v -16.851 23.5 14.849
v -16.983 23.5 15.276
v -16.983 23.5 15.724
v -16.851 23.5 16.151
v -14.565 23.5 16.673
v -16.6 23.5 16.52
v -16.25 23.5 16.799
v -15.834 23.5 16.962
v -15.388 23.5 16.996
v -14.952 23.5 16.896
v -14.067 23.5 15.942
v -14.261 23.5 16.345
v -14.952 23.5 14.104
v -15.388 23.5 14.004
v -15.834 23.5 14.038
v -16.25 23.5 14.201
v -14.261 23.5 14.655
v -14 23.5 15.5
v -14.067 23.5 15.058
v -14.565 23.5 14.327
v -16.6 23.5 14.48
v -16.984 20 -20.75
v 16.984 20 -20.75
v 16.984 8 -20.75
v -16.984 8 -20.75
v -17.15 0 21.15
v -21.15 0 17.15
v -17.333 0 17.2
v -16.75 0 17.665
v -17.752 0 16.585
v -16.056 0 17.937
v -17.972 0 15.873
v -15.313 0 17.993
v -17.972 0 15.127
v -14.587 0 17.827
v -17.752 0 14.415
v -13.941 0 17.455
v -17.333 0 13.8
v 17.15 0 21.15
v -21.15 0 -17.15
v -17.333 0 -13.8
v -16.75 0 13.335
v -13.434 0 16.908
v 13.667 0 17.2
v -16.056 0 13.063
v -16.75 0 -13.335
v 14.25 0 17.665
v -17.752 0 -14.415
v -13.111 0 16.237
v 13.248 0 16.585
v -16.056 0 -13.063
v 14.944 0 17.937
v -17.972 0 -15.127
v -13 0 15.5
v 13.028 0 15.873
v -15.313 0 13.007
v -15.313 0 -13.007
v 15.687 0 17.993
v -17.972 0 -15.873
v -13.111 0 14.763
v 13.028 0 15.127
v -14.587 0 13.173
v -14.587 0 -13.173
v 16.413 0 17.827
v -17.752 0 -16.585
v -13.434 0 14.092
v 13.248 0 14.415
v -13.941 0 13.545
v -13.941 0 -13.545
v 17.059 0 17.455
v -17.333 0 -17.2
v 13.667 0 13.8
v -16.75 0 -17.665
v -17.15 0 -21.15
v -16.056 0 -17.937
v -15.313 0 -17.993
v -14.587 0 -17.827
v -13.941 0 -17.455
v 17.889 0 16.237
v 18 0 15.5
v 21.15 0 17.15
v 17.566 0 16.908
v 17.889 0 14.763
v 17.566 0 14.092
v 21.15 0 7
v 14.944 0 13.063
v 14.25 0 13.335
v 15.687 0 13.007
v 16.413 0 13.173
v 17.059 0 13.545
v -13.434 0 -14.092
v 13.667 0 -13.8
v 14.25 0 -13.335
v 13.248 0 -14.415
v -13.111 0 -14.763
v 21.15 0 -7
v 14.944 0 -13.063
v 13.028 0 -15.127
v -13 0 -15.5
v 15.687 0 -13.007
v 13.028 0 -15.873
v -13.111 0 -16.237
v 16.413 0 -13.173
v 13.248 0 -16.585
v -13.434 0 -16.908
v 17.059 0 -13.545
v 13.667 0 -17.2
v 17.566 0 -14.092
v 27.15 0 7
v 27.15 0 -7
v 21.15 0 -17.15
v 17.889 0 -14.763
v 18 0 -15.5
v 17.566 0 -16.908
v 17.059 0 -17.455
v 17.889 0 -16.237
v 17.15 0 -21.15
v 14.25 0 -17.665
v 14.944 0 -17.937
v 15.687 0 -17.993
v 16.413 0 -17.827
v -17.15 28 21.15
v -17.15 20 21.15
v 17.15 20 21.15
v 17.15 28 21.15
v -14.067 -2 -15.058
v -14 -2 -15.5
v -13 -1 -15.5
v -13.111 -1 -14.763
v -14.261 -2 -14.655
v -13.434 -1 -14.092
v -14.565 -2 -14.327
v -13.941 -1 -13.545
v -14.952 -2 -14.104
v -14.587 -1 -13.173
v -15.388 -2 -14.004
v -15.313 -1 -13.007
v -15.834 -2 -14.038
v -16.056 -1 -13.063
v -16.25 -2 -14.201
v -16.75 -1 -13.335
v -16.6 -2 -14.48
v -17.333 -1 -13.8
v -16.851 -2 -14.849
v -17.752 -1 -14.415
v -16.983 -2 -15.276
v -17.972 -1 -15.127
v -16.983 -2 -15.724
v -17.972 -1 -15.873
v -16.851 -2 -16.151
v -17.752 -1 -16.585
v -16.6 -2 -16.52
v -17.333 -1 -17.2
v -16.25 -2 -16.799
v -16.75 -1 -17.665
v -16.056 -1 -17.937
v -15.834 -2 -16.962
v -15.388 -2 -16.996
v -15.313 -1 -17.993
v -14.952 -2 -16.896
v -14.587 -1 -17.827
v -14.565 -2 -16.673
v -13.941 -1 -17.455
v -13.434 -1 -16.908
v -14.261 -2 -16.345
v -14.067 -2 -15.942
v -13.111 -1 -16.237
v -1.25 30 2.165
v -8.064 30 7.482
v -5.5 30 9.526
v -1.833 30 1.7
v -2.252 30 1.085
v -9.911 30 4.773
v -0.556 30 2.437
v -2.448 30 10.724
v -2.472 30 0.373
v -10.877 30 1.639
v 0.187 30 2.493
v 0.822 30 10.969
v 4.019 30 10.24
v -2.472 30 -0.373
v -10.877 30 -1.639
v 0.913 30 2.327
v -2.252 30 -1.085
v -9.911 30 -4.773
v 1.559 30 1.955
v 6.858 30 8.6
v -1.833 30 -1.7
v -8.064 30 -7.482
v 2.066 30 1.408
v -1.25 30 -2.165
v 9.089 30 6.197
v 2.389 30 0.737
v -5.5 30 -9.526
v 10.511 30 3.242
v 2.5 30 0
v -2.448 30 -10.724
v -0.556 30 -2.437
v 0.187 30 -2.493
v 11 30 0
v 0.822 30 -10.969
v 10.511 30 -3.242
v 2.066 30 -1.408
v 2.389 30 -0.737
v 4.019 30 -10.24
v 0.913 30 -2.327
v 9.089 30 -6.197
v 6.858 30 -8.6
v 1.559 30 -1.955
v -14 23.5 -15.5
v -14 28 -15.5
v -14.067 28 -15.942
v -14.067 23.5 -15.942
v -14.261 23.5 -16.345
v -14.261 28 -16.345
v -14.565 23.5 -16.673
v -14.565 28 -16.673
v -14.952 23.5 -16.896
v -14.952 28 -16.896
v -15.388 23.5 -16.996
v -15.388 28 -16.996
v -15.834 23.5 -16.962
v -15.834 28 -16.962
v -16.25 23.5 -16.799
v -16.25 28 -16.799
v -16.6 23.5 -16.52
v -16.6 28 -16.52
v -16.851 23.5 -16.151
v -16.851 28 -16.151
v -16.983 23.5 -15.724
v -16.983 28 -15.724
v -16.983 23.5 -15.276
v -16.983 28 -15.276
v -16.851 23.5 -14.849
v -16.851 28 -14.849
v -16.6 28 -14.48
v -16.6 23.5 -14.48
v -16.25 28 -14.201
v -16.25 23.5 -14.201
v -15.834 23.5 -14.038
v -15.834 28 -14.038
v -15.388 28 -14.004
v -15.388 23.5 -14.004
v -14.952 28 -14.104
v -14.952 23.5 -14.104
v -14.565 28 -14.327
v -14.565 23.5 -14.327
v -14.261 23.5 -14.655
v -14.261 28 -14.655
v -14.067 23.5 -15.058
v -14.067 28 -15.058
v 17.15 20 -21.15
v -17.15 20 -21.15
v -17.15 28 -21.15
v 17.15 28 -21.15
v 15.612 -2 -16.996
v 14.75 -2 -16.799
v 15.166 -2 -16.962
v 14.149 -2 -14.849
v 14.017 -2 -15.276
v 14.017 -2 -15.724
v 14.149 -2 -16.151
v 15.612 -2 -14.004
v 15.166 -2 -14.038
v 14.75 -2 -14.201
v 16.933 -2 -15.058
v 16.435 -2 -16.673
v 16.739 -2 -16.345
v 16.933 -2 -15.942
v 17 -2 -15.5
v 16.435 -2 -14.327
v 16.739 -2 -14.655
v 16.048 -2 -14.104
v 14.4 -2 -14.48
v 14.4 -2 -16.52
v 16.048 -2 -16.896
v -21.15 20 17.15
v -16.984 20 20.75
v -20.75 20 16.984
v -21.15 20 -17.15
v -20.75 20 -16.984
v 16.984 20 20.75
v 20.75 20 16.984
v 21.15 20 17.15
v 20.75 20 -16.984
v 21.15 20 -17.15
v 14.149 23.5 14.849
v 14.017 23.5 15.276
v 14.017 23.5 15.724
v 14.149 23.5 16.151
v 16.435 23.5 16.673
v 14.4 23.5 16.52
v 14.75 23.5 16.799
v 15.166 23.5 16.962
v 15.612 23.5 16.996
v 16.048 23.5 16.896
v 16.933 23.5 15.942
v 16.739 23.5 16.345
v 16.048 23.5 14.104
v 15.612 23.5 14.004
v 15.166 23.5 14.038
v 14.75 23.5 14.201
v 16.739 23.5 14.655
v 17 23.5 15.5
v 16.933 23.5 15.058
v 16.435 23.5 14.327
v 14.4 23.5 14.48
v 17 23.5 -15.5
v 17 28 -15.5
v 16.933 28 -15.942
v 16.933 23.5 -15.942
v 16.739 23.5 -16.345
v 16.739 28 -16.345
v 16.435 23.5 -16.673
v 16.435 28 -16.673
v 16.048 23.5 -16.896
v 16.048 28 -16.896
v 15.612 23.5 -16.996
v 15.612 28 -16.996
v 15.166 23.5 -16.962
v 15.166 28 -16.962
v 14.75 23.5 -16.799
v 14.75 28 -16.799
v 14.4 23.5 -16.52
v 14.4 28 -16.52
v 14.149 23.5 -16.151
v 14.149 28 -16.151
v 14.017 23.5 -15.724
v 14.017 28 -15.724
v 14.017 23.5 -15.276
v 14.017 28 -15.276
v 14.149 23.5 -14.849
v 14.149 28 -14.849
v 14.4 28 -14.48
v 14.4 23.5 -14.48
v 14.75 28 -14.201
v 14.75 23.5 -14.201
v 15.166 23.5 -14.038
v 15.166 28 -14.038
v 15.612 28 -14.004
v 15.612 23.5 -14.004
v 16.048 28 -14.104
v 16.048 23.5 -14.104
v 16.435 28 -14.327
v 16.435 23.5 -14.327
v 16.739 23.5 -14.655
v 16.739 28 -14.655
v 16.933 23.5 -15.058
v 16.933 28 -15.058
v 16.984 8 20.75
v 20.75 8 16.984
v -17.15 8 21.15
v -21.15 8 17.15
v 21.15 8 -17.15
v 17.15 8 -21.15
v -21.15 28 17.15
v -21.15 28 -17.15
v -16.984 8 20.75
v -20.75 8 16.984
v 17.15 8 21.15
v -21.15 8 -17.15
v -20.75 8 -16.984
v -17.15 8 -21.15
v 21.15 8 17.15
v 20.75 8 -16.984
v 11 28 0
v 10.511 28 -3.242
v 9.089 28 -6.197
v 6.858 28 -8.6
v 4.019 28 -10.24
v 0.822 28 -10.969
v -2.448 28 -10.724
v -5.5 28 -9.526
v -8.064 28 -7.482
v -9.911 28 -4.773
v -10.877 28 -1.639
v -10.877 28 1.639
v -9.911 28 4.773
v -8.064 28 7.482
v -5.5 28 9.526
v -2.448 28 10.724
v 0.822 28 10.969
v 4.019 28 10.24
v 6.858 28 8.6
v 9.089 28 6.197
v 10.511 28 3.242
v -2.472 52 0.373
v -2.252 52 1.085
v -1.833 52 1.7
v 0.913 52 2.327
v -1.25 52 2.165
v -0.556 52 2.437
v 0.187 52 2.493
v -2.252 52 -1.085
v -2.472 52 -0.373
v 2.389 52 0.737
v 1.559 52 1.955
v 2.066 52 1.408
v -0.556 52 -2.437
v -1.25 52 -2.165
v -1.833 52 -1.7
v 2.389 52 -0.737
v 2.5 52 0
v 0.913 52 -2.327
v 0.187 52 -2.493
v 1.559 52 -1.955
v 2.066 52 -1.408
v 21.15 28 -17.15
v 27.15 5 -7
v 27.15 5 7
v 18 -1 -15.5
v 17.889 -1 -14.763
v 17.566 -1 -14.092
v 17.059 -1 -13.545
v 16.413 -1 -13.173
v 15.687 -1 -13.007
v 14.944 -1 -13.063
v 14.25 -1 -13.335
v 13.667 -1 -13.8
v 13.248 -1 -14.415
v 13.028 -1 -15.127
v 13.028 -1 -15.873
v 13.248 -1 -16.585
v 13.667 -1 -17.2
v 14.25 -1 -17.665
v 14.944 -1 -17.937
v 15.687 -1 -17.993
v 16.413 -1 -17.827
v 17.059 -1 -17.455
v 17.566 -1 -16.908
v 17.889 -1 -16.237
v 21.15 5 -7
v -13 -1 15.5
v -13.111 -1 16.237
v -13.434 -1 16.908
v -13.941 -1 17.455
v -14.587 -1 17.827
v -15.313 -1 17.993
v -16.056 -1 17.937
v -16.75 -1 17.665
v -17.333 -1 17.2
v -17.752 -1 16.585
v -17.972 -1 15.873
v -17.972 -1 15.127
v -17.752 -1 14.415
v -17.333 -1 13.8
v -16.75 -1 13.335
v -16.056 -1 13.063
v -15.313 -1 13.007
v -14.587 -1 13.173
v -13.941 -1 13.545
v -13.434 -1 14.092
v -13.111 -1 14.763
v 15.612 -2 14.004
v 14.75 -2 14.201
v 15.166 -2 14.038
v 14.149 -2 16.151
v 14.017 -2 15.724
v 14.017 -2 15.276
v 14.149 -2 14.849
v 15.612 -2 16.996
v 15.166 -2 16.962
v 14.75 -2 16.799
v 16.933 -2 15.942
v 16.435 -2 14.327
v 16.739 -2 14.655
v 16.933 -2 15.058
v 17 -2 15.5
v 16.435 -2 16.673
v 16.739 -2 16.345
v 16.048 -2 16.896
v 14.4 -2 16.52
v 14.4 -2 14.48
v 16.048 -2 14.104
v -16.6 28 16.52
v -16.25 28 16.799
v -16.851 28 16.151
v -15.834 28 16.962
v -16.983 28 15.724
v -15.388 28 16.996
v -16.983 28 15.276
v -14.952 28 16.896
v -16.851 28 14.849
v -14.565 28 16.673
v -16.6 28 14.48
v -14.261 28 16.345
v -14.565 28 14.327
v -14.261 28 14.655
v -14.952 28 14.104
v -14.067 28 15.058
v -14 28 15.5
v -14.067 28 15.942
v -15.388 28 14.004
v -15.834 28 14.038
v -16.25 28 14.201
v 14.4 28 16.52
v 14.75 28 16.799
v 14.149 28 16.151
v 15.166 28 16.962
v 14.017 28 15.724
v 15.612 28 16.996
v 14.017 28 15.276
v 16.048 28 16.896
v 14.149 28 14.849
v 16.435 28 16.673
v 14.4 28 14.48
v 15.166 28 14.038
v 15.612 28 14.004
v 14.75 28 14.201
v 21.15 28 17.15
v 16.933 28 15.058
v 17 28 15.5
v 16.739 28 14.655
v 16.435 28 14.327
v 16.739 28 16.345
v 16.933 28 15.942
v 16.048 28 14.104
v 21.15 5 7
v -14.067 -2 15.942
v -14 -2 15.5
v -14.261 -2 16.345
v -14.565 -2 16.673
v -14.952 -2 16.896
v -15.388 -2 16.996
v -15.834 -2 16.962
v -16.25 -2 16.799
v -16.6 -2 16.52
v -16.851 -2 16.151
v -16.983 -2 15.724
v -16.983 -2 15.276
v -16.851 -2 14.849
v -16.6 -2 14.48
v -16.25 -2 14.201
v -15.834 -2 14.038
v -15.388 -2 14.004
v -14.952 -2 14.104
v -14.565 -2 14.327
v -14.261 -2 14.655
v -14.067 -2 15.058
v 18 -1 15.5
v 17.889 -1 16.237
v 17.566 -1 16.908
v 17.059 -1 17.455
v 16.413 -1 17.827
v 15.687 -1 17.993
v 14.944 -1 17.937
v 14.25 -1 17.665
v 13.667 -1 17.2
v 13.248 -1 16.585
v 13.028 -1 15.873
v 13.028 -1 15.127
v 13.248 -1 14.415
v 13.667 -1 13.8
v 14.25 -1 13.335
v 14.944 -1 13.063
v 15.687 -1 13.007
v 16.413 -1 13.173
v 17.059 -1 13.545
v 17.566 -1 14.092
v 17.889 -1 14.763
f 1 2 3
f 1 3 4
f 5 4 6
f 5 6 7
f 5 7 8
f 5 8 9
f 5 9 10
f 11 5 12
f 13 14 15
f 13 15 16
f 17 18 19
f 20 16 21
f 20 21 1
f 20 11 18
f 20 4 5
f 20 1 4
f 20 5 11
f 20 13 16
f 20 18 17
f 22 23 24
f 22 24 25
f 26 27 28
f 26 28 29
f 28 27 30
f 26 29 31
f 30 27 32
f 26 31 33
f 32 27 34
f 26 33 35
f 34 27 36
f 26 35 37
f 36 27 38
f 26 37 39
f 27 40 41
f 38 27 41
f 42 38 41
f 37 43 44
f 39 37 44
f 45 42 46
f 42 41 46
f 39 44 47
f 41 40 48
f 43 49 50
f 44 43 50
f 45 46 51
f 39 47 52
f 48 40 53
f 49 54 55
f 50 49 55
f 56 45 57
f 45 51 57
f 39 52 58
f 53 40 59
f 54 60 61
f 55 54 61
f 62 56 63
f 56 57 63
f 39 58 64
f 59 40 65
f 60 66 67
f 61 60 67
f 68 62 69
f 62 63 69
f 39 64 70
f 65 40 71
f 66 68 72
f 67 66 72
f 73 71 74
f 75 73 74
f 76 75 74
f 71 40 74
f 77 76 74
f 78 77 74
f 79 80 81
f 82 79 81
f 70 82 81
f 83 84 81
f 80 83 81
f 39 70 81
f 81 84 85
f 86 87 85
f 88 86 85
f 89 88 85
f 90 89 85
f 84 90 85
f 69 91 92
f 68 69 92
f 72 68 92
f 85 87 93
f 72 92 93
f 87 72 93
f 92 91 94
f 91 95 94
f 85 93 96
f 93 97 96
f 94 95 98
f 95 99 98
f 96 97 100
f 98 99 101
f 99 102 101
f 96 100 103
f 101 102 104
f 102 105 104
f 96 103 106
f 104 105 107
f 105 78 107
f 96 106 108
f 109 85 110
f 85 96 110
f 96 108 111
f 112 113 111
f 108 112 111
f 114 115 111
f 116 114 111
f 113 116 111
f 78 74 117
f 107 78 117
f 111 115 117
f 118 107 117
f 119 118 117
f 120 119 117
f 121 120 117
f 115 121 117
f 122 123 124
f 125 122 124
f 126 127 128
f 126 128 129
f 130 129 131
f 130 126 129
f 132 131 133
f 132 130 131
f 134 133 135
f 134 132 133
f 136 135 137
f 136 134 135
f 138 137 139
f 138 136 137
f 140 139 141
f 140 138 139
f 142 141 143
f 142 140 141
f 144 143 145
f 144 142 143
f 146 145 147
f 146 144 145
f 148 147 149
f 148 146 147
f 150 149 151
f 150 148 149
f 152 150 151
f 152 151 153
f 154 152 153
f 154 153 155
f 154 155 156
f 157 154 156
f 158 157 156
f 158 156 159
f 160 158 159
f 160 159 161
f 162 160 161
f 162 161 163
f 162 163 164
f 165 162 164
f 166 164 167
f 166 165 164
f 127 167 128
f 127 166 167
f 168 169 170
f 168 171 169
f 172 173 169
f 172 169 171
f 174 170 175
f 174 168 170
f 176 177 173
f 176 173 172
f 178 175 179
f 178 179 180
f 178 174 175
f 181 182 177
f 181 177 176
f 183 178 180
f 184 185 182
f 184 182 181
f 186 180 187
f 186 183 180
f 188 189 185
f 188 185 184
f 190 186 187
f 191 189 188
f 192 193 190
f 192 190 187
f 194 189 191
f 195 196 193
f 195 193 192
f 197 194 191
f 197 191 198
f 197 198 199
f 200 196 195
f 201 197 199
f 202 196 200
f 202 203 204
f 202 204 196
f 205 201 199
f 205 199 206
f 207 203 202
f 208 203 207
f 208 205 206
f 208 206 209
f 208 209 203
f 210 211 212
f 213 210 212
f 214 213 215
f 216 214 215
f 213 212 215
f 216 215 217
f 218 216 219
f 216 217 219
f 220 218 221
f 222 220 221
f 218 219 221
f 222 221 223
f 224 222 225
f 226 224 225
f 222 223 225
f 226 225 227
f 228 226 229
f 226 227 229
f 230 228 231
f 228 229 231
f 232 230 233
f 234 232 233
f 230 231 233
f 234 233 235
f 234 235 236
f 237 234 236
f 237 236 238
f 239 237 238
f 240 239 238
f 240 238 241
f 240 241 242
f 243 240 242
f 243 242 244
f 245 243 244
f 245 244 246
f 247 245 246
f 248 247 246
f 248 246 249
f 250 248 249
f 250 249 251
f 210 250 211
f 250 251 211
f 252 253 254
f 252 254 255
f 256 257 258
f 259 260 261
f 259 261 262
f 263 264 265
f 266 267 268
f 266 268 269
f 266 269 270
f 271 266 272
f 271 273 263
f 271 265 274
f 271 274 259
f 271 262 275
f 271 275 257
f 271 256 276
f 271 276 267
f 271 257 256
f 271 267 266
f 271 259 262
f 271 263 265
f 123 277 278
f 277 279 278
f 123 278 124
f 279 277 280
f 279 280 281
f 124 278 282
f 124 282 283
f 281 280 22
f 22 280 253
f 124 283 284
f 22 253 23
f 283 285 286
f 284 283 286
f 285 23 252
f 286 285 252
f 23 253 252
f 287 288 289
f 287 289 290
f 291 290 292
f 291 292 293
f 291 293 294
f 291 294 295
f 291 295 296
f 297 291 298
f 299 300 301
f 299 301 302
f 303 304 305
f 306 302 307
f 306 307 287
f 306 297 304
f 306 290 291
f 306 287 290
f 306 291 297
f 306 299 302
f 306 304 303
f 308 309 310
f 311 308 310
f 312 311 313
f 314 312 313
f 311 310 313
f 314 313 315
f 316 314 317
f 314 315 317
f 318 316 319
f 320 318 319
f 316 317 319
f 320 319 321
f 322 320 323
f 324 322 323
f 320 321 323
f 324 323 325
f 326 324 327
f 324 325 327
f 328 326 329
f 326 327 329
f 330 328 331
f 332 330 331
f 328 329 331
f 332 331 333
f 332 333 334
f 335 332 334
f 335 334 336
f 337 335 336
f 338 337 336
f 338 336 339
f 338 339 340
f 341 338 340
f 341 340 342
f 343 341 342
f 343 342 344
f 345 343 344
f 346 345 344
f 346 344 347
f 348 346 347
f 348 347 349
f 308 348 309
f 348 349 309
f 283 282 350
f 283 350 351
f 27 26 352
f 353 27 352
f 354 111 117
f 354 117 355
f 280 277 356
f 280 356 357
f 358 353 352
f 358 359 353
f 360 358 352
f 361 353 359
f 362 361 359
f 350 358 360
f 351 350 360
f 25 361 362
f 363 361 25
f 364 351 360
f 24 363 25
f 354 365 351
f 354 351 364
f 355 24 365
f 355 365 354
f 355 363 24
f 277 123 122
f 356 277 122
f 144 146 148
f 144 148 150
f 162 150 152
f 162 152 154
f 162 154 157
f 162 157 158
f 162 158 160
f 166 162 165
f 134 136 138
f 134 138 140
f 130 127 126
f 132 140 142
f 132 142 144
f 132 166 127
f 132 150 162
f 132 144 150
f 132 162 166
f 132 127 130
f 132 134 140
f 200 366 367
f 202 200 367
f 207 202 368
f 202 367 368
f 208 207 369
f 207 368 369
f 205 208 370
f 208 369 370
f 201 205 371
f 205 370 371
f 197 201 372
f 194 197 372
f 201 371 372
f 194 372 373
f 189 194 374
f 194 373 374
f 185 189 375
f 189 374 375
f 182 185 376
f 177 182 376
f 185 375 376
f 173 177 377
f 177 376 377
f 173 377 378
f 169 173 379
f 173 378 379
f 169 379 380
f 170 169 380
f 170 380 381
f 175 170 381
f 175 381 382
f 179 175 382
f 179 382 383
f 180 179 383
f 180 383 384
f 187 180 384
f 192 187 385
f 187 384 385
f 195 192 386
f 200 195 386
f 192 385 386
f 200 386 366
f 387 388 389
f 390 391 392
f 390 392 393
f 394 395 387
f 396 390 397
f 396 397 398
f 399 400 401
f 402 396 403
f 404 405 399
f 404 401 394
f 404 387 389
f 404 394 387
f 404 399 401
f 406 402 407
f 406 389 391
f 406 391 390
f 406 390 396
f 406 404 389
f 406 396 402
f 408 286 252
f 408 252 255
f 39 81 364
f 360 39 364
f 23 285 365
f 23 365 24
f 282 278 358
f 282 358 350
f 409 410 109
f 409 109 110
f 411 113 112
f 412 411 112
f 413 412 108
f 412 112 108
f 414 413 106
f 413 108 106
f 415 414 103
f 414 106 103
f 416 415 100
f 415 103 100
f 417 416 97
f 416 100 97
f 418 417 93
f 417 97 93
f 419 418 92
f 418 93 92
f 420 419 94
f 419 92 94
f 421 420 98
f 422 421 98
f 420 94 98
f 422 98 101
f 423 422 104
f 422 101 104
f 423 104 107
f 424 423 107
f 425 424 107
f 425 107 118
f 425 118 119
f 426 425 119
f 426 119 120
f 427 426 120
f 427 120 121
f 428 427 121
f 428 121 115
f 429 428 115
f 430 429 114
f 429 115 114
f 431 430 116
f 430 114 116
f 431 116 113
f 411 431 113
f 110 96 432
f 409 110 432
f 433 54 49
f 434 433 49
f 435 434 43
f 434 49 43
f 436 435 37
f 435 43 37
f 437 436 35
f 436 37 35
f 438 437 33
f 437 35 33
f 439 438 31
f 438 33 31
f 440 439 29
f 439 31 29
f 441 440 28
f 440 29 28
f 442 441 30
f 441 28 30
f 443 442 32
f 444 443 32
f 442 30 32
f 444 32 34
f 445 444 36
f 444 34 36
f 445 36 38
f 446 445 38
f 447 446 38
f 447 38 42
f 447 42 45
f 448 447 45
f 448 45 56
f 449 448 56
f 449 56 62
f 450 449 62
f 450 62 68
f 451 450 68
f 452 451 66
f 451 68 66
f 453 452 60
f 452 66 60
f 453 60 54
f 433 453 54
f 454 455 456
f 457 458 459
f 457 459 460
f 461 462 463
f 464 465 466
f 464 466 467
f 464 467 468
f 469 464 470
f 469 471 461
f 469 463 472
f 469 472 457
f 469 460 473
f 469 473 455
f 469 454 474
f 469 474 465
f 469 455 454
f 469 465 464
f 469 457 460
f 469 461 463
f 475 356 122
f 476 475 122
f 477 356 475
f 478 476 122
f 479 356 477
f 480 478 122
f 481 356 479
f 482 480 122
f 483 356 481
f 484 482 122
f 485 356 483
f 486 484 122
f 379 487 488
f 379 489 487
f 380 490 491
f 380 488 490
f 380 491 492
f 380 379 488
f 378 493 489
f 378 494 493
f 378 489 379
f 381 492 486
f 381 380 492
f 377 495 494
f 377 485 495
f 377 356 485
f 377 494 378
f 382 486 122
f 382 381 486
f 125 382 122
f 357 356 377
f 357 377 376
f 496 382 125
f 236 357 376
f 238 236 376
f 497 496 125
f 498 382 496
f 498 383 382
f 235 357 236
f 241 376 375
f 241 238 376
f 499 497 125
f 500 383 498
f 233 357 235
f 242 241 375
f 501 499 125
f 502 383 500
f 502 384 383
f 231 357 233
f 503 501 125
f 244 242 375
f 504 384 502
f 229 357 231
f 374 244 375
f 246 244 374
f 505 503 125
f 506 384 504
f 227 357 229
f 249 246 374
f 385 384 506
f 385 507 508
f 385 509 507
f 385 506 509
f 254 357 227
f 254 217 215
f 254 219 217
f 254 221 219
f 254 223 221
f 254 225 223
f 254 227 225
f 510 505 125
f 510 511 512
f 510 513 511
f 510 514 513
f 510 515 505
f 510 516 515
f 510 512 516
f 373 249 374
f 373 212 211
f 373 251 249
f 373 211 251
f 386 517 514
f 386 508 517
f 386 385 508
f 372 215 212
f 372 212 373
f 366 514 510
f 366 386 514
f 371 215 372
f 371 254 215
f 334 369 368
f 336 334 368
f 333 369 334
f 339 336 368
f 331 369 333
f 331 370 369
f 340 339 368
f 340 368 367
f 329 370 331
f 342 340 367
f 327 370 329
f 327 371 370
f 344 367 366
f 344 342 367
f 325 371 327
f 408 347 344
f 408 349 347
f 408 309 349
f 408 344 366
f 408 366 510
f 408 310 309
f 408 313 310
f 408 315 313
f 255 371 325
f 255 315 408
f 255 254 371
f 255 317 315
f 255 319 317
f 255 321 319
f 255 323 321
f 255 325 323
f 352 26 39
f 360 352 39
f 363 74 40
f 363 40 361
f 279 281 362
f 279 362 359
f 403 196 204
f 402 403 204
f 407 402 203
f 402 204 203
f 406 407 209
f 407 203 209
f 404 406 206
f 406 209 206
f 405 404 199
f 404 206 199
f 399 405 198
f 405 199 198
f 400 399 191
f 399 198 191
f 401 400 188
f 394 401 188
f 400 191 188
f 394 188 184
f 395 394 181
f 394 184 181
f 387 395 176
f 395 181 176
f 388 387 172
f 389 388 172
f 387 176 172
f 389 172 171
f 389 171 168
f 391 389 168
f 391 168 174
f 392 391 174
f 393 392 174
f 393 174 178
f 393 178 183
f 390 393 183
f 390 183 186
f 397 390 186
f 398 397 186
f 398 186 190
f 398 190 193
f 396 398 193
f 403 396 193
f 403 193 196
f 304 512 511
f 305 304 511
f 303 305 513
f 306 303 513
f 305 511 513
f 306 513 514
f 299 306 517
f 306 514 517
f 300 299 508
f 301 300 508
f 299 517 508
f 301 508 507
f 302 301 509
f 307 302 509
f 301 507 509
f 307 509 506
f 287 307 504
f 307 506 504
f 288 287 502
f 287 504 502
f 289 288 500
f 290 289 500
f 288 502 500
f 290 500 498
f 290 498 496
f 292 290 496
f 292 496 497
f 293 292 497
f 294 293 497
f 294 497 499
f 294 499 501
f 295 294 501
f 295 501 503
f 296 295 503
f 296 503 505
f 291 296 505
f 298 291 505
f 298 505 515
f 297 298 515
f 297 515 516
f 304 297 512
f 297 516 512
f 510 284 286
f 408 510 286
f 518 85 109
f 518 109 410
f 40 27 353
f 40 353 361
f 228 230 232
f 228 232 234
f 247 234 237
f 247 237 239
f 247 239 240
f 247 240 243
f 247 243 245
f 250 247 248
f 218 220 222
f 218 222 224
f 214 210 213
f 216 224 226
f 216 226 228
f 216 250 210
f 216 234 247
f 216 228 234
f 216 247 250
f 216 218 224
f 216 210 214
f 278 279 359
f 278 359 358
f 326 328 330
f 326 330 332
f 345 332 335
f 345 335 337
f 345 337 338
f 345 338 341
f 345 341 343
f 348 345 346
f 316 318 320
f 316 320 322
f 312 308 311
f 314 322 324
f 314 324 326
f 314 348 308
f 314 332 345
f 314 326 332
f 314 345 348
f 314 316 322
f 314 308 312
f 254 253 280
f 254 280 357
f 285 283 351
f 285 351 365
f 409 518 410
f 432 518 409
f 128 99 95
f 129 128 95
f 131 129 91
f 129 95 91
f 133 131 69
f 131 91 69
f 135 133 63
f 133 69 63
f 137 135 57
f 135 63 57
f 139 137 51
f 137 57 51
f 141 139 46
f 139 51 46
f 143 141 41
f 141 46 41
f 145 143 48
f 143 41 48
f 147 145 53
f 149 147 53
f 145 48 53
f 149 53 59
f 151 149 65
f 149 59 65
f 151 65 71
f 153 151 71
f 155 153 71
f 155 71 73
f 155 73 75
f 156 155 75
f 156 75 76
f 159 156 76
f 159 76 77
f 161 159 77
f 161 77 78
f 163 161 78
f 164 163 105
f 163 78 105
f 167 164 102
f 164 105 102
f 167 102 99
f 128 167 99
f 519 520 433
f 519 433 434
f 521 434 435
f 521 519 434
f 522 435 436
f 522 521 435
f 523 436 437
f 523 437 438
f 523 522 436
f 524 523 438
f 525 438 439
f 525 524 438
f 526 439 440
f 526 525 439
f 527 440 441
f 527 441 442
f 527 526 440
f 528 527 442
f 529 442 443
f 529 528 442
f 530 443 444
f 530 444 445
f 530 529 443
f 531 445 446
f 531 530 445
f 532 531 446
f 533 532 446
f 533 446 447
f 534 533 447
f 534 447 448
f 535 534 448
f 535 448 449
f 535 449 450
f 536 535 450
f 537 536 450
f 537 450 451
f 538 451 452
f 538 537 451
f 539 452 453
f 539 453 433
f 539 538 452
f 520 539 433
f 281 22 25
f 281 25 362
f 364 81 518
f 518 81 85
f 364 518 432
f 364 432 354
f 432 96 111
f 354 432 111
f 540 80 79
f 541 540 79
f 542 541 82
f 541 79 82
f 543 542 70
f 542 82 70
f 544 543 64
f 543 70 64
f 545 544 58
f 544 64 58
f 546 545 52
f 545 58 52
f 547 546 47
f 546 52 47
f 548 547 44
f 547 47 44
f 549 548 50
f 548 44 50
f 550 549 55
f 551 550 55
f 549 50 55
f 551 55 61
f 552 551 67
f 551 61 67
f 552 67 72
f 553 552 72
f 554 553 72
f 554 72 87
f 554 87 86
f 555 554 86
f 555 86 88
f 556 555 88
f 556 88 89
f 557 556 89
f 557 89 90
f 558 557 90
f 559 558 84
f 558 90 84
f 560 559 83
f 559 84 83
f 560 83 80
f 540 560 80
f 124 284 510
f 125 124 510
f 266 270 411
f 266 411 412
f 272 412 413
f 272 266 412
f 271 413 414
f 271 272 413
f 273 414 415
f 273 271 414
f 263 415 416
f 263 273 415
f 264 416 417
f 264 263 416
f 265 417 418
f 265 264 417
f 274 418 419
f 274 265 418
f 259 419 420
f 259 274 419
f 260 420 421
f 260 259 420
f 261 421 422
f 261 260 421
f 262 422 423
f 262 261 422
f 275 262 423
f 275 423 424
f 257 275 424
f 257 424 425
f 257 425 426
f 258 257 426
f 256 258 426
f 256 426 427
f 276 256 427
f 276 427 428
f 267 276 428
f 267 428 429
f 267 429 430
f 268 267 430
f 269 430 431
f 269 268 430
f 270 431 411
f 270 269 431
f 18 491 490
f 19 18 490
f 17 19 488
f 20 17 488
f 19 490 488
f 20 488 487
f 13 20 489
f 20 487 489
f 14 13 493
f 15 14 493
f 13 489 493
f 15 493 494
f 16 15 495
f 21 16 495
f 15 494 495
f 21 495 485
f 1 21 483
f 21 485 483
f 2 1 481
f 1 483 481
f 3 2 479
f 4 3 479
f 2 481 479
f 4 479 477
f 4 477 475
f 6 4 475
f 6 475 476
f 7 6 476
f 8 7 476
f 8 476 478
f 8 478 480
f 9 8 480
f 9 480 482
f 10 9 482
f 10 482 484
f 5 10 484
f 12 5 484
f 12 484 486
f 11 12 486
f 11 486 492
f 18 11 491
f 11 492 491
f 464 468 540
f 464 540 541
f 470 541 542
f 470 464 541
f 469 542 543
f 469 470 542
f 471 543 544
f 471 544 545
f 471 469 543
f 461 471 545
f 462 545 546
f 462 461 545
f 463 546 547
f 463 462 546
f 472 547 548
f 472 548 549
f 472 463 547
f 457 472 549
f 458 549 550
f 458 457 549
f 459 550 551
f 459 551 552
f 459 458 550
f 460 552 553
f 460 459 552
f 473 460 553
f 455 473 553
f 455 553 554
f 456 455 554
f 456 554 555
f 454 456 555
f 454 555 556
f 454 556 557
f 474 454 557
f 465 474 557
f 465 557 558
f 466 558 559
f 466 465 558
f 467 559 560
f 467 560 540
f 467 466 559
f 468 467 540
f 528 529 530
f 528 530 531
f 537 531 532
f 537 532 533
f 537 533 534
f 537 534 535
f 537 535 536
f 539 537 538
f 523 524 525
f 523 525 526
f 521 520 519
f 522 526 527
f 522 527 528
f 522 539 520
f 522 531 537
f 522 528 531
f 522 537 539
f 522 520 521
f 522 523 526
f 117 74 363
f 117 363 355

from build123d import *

# Parameters (mm, degrees)
SKETCH_2_W          = 42.3
SKETCH_2_H          = 42.3
EXTRUDE_1_DEPTH     = 28
SKETCH_3_R          = 11
EXTRUDE_2_DEPTH     = 2
EXTRUDE_START       = -2
SKETCH_4_R          = 2.5
EXTRUDE_3_DEPTH     = 24
SKETCH_5_R          = 1.5
CUT_EXTRUDE_1_DEPTH = 4.5
CHAMFER_1_SIZE      = 4
CUT_EXTRUDE_START   = -8
SKETCH_6_OUTSIDE_W  = 60.152
SKETCH_6_OUTSIDE_H  = 60.152
CUT_EXTRUDE_2_DEPTH = 12
SKETCH_7_R          = 2.5
EXTRUDE_4_DEPTH     = 2
CHAMFER_2_SIZE      = 1
SKETCH_8_W          = 14
SKETCH_8_H          = 5
EXTRUDE_5_DEPTH     = 6


with BuildPart() as part:
    # Эскиз2 → Бобышка-Вытянуть1 (new body)
    with BuildSketch(Plane(origin=(0, 0, 0), x_dir=(1, 0, 0), z_dir=(0, 1, 0))):
        Rectangle(SKETCH_2_W, SKETCH_2_H)
    extrude(amount=EXTRUDE_1_DEPTH)

    # Эскиз3 → Бобышка-Вытянуть2 (add)
    with BuildSketch(Plane(origin=(0, 28, 0), x_dir=(1, 0, 0), z_dir=(0, 1, 0))):
        Circle(SKETCH_3_R)
    extrude(amount=EXTRUDE_2_DEPTH)

    # Эскиз4 → Бобышка-Вытянуть3 (add)
    with BuildSketch(Plane(origin=(0, 30, 0), x_dir=(1, 0, 0), z_dir=(0, 1, 0)).offset(EXTRUDE_START)):
        Circle(SKETCH_4_R)
    extrude(amount=EXTRUDE_3_DEPTH)

    # Эскиз5 → Вырез-Вытянуть1 (cut)
    with BuildSketch(Plane(origin=(0, 28, 0), x_dir=(1, 0, 0), z_dir=(0, 1, 0))):
        with Locations((-15.5, 15.5)):
            Circle(SKETCH_5_R)
        with Locations((15.5, 15.5)):
            Circle(SKETCH_5_R)
        with Locations((15.5, -15.5)):
            Circle(SKETCH_5_R)
        with Locations((-15.5, -15.5)):
            Circle(SKETCH_5_R)
    extrude(amount=-CUT_EXTRUDE_1_DEPTH, mode=Mode.SUBTRACT)

    # Фаска1
    chamfer_1_edges = [part.edges().sort_by_distance(p)[0] for p in [
        (21.15, 14, 21.15),
        (-21.15, 14, 21.15),
        (-21.15, 14, -21.15),
        (21.15, 14, -21.15),
    ]]
    chamfer(chamfer_1_edges, length=CHAMFER_1_SIZE)

    # Эскиз6 outside → Вырез-Вытянуть2 (cut)
    with BuildSketch(Plane(origin=(0, 28, 0), x_dir=(1, 0, 0), z_dir=(0, 1, 0)).offset(CUT_EXTRUDE_START)):
        Rectangle(SKETCH_6_OUTSIDE_W, SKETCH_6_OUTSIDE_H)
        Polygon((-20.75, 16.984314575), (-20.75, -16.984314575), (-16.984314575, -20.75), (16.984314575, -20.75), (20.75, -16.984314575), (20.75, 16.984314575), (16.984314575, 20.75), (-16.984314575, 20.75), align=None, mode=Mode.SUBTRACT)
    extrude(amount=-CUT_EXTRUDE_2_DEPTH, mode=Mode.SUBTRACT)

    # Эскиз7 → Бобышка-Вытянуть4 (add)
    with BuildSketch(Plane.XZ):
        with Locations((-15.5, -15.5)):
            Circle(SKETCH_7_R)
        with Locations((15.5, -15.5)):
            Circle(SKETCH_7_R)
        with Locations((15.5, 15.5)):
            Circle(SKETCH_7_R)
        with Locations((-15.5, 15.5)):
            Circle(SKETCH_7_R)
    extrude(amount=EXTRUDE_4_DEPTH)

    # Фаска2
    chamfer_2_edges = [part.edges().sort_by_distance(p)[0] for p in [
        (-18, -2, -15.5),
        (13, -2, -15.5),
        (13, -2, 15.5),
        (-18, -2, 15.5),
    ]]
    chamfer(chamfer_2_edges, length=CHAMFER_2_SIZE)

    # Эскиз8 → Бобышка-Вытянуть5 (add)
    with BuildSketch(Plane(origin=(21.15, 0, 0), x_dir=(0, 0, -1), z_dir=(1, 0, 0))):
        with Locations((0, 2.5)):
            Rectangle(SKETCH_8_W, SKETCH_8_H)
    extrude(amount=EXTRUDE_5_DEPTH)


solid = part.part
